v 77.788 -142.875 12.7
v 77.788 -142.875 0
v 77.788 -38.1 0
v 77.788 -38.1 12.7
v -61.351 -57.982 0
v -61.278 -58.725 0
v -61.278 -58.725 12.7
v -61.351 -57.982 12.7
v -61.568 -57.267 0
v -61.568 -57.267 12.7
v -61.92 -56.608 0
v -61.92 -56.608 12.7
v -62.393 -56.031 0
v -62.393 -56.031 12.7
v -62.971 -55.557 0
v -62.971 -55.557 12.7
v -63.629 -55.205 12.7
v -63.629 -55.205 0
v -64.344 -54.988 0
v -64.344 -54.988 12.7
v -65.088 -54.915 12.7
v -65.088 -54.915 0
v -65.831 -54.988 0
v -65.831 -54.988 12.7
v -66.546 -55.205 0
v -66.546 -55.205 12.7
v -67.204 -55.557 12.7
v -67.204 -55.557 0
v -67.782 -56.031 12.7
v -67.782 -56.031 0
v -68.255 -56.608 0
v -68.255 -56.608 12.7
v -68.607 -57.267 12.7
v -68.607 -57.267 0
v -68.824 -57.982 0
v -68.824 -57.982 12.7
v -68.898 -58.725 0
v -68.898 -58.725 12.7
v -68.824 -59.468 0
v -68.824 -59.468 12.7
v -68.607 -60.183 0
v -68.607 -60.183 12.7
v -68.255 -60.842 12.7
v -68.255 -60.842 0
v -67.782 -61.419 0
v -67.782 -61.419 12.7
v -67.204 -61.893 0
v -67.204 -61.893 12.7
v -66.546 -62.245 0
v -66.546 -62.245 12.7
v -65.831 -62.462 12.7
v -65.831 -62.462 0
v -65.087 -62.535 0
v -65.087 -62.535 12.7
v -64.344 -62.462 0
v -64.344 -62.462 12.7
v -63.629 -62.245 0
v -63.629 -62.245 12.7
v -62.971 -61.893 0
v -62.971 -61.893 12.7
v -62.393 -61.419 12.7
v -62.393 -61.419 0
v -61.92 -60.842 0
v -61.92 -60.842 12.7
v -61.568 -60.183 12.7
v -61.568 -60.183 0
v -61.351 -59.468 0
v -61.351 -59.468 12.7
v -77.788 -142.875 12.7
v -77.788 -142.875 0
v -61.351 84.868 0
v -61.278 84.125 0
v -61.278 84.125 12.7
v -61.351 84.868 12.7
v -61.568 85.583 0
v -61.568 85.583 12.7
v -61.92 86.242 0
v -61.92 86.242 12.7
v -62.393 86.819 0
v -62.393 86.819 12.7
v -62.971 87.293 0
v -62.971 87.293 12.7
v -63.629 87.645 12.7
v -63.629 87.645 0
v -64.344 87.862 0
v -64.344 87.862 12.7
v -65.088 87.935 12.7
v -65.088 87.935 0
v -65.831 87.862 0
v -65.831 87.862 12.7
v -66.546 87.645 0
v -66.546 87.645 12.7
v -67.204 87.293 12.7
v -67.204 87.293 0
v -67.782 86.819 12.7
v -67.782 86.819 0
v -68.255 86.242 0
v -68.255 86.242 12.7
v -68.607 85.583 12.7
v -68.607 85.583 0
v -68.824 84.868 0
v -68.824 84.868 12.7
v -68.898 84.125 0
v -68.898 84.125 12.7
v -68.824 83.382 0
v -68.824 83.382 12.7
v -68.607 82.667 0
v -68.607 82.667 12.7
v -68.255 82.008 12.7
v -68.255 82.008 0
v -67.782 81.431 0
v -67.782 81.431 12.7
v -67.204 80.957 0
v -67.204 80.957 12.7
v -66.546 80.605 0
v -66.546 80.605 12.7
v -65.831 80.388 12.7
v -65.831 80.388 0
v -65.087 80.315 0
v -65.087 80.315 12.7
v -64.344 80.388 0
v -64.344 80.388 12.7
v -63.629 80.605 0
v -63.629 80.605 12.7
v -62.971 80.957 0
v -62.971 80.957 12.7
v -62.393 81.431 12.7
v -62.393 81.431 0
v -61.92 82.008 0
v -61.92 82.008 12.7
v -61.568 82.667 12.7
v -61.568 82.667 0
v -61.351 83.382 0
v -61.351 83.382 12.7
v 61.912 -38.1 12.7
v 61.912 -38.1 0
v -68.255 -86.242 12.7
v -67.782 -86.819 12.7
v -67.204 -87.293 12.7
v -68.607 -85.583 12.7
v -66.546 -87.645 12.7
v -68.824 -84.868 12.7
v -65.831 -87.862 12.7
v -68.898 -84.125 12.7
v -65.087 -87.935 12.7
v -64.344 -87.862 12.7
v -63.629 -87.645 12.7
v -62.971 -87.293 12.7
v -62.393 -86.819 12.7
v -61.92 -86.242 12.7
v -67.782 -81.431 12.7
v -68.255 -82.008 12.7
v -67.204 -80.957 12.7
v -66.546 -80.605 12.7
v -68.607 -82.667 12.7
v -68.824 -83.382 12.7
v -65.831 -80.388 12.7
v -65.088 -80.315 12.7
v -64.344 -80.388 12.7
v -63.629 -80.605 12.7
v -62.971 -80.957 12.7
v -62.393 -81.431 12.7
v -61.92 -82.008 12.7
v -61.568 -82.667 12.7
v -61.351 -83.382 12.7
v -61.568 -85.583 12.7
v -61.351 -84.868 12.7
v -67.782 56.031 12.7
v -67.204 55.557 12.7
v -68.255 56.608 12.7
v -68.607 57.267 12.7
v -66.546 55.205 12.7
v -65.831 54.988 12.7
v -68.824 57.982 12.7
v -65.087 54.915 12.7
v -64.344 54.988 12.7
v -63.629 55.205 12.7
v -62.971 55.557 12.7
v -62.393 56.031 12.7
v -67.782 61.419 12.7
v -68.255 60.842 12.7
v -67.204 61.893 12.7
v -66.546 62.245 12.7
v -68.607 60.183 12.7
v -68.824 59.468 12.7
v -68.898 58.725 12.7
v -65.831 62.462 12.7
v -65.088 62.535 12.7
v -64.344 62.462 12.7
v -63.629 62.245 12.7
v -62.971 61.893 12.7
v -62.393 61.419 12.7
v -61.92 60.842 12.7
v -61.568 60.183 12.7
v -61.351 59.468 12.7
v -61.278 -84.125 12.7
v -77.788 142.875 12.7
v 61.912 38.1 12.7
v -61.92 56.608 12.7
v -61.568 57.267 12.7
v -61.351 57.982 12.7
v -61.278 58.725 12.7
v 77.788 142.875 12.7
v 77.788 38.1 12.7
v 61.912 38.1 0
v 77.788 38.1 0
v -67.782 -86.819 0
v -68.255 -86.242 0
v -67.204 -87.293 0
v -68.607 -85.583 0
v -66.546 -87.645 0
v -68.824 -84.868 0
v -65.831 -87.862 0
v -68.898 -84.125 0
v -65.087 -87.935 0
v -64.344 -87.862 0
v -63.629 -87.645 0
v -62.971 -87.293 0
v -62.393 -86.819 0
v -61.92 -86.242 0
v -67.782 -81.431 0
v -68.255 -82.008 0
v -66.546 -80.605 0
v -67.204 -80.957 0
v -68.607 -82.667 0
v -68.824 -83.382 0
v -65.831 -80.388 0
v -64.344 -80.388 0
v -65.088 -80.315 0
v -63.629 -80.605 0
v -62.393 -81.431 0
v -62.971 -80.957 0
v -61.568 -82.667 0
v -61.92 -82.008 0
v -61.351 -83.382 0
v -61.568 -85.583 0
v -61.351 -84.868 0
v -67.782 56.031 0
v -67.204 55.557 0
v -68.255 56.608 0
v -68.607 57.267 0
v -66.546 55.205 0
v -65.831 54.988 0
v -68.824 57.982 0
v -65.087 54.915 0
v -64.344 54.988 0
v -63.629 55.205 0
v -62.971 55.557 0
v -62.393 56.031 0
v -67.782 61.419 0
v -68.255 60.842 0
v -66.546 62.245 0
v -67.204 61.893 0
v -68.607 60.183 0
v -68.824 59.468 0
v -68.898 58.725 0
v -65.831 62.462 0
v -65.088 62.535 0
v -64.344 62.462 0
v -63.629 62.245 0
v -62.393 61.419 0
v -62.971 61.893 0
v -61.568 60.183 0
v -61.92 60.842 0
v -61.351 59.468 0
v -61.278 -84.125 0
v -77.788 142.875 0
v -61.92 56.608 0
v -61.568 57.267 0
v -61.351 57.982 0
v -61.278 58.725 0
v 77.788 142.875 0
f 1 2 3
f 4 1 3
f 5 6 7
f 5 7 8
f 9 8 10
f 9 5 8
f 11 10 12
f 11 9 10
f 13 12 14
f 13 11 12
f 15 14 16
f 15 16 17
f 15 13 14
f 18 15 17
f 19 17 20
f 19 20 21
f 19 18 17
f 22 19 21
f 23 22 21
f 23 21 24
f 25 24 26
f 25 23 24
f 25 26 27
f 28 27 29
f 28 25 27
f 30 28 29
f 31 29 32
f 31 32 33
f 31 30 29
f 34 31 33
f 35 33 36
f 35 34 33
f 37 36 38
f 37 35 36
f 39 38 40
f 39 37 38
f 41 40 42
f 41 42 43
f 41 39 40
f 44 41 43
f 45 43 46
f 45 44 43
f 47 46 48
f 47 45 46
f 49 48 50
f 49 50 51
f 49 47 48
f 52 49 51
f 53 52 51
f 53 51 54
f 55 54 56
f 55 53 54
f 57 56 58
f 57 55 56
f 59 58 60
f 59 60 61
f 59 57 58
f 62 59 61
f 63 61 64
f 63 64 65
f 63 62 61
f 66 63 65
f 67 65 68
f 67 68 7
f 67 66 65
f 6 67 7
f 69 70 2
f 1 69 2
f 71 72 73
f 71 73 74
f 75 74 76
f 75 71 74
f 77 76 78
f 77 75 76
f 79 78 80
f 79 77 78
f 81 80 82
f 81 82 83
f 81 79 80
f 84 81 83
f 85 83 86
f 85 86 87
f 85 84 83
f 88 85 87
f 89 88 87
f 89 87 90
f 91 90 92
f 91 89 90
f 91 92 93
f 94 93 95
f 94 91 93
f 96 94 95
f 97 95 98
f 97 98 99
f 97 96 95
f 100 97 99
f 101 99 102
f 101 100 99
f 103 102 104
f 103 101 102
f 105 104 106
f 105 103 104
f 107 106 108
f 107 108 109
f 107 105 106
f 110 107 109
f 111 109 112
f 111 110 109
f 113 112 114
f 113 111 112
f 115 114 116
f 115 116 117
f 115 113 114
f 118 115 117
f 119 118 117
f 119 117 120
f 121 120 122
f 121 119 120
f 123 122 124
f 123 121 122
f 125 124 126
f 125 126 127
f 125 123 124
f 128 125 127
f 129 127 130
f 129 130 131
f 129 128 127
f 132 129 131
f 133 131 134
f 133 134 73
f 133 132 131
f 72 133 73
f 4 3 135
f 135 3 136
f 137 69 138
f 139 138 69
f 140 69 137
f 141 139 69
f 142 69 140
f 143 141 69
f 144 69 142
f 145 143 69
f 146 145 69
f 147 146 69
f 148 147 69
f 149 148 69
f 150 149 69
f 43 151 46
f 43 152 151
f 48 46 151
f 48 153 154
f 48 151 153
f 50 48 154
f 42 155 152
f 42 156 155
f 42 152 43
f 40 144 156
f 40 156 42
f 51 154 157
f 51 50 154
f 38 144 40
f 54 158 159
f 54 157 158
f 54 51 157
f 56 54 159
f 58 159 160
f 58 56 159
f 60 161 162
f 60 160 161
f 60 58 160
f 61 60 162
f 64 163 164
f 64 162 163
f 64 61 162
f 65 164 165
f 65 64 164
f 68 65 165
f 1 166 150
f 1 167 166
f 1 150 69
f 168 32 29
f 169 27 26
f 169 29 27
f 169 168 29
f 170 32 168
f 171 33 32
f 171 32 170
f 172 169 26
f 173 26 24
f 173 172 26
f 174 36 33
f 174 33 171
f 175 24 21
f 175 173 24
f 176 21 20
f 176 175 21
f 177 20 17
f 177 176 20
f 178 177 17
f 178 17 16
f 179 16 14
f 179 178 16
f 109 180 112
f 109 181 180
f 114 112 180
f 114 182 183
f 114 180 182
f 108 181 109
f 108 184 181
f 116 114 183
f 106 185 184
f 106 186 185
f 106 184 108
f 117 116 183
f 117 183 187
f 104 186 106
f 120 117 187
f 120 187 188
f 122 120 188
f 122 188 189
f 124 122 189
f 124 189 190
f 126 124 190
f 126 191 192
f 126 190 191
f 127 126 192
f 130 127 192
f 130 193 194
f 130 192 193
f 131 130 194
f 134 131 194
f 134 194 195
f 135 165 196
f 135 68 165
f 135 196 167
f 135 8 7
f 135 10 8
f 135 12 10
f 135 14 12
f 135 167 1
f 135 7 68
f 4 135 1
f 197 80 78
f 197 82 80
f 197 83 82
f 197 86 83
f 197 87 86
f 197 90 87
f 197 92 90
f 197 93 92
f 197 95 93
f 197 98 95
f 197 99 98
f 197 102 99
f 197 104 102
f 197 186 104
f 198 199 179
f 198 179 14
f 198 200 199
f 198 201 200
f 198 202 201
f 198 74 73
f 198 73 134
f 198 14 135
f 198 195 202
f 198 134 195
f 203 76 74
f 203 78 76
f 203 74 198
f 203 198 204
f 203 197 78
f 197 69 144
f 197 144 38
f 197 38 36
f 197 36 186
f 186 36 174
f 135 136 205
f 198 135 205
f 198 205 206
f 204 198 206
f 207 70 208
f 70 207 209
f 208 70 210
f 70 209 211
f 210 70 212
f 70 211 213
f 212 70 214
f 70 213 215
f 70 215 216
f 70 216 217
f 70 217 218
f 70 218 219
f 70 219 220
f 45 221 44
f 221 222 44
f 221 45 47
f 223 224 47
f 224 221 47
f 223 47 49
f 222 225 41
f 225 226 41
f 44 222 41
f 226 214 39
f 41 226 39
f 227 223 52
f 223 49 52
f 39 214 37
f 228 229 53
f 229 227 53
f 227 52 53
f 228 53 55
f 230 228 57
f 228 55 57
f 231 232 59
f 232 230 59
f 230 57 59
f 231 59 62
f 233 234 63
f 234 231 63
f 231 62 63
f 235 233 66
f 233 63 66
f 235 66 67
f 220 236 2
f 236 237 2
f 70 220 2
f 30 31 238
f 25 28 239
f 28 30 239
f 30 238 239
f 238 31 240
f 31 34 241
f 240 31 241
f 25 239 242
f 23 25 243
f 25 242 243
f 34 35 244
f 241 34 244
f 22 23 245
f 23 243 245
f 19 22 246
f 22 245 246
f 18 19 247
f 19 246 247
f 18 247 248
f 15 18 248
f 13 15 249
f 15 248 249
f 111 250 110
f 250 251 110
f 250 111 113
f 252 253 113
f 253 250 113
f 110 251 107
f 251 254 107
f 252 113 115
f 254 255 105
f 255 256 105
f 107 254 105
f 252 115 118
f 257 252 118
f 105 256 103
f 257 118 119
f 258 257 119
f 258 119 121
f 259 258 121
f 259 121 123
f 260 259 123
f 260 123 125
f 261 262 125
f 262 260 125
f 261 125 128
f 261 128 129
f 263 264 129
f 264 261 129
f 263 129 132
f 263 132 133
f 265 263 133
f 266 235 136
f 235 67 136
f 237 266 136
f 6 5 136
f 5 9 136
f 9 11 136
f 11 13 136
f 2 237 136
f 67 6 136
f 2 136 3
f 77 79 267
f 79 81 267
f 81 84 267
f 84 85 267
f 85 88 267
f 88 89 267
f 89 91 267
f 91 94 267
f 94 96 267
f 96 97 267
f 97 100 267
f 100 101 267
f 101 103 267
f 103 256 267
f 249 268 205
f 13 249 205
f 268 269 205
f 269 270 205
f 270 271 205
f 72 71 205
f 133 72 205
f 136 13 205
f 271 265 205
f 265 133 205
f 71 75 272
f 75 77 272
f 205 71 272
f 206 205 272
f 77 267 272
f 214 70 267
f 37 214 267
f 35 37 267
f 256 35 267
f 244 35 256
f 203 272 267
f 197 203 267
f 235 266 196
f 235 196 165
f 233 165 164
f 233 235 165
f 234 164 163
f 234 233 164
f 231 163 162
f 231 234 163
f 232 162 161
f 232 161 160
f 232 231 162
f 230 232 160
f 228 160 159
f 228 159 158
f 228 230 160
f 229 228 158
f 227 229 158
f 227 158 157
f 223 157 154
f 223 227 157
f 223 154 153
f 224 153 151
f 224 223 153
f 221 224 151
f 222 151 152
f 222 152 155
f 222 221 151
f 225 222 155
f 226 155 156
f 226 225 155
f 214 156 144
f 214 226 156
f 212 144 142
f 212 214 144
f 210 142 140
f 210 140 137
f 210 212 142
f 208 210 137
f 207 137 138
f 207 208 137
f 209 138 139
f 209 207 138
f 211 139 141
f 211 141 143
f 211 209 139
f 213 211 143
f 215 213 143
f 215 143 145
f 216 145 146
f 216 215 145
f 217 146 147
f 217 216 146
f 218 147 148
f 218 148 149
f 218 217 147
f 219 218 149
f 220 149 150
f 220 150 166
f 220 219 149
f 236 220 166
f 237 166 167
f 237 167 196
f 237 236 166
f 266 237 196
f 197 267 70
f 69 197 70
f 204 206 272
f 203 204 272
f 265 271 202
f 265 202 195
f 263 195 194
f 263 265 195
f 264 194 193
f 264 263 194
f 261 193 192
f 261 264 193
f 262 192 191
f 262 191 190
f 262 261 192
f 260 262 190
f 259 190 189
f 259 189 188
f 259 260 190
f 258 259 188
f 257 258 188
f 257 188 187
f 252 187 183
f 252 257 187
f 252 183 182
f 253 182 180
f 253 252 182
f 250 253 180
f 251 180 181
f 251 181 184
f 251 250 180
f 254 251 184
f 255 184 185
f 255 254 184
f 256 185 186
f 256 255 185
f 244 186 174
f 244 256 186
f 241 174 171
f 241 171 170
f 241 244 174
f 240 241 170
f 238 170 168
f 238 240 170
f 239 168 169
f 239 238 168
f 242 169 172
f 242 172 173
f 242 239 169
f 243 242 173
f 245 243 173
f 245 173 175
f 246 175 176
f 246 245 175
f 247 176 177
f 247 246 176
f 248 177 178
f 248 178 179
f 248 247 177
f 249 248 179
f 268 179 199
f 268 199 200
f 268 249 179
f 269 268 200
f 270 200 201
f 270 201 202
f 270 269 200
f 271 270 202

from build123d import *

# Parameters (mm, degrees)
F0_R     = 3.81
F1_DEPTH = 12.7


with BuildPart() as f1:
    # F0 (on Top) → F1 (new body)
    with BuildSketch(Plane.XY):
        Polygon((77.7875, 38.1), (77.7875, 142.875), (-77.7875, 142.875), (-77.7875, 71.4248), (-77.7875, 0), (-77.7875, -71.4248), (-77.7875, -142.875), (77.7875, -142.875), (77.7875, -38.1), (61.9125, -38.1), (61.9125, 38.1), align=None)
        with Locations((-65.0875, -84.1248)):
            Circle(F0_R, mode=Mode.SUBTRACT)
        with Locations((-65.0875, -58.7248)):
            Circle(F0_R, mode=Mode.SUBTRACT)
        with Locations((-65.0875, 58.7248)):
            Circle(F0_R, mode=Mode.SUBTRACT)
        with Locations((-65.0875, 84.1248)):
            Circle(F0_R, mode=Mode.SUBTRACT)
    extrude(amount=F1_DEPTH)


solid = f1.part
